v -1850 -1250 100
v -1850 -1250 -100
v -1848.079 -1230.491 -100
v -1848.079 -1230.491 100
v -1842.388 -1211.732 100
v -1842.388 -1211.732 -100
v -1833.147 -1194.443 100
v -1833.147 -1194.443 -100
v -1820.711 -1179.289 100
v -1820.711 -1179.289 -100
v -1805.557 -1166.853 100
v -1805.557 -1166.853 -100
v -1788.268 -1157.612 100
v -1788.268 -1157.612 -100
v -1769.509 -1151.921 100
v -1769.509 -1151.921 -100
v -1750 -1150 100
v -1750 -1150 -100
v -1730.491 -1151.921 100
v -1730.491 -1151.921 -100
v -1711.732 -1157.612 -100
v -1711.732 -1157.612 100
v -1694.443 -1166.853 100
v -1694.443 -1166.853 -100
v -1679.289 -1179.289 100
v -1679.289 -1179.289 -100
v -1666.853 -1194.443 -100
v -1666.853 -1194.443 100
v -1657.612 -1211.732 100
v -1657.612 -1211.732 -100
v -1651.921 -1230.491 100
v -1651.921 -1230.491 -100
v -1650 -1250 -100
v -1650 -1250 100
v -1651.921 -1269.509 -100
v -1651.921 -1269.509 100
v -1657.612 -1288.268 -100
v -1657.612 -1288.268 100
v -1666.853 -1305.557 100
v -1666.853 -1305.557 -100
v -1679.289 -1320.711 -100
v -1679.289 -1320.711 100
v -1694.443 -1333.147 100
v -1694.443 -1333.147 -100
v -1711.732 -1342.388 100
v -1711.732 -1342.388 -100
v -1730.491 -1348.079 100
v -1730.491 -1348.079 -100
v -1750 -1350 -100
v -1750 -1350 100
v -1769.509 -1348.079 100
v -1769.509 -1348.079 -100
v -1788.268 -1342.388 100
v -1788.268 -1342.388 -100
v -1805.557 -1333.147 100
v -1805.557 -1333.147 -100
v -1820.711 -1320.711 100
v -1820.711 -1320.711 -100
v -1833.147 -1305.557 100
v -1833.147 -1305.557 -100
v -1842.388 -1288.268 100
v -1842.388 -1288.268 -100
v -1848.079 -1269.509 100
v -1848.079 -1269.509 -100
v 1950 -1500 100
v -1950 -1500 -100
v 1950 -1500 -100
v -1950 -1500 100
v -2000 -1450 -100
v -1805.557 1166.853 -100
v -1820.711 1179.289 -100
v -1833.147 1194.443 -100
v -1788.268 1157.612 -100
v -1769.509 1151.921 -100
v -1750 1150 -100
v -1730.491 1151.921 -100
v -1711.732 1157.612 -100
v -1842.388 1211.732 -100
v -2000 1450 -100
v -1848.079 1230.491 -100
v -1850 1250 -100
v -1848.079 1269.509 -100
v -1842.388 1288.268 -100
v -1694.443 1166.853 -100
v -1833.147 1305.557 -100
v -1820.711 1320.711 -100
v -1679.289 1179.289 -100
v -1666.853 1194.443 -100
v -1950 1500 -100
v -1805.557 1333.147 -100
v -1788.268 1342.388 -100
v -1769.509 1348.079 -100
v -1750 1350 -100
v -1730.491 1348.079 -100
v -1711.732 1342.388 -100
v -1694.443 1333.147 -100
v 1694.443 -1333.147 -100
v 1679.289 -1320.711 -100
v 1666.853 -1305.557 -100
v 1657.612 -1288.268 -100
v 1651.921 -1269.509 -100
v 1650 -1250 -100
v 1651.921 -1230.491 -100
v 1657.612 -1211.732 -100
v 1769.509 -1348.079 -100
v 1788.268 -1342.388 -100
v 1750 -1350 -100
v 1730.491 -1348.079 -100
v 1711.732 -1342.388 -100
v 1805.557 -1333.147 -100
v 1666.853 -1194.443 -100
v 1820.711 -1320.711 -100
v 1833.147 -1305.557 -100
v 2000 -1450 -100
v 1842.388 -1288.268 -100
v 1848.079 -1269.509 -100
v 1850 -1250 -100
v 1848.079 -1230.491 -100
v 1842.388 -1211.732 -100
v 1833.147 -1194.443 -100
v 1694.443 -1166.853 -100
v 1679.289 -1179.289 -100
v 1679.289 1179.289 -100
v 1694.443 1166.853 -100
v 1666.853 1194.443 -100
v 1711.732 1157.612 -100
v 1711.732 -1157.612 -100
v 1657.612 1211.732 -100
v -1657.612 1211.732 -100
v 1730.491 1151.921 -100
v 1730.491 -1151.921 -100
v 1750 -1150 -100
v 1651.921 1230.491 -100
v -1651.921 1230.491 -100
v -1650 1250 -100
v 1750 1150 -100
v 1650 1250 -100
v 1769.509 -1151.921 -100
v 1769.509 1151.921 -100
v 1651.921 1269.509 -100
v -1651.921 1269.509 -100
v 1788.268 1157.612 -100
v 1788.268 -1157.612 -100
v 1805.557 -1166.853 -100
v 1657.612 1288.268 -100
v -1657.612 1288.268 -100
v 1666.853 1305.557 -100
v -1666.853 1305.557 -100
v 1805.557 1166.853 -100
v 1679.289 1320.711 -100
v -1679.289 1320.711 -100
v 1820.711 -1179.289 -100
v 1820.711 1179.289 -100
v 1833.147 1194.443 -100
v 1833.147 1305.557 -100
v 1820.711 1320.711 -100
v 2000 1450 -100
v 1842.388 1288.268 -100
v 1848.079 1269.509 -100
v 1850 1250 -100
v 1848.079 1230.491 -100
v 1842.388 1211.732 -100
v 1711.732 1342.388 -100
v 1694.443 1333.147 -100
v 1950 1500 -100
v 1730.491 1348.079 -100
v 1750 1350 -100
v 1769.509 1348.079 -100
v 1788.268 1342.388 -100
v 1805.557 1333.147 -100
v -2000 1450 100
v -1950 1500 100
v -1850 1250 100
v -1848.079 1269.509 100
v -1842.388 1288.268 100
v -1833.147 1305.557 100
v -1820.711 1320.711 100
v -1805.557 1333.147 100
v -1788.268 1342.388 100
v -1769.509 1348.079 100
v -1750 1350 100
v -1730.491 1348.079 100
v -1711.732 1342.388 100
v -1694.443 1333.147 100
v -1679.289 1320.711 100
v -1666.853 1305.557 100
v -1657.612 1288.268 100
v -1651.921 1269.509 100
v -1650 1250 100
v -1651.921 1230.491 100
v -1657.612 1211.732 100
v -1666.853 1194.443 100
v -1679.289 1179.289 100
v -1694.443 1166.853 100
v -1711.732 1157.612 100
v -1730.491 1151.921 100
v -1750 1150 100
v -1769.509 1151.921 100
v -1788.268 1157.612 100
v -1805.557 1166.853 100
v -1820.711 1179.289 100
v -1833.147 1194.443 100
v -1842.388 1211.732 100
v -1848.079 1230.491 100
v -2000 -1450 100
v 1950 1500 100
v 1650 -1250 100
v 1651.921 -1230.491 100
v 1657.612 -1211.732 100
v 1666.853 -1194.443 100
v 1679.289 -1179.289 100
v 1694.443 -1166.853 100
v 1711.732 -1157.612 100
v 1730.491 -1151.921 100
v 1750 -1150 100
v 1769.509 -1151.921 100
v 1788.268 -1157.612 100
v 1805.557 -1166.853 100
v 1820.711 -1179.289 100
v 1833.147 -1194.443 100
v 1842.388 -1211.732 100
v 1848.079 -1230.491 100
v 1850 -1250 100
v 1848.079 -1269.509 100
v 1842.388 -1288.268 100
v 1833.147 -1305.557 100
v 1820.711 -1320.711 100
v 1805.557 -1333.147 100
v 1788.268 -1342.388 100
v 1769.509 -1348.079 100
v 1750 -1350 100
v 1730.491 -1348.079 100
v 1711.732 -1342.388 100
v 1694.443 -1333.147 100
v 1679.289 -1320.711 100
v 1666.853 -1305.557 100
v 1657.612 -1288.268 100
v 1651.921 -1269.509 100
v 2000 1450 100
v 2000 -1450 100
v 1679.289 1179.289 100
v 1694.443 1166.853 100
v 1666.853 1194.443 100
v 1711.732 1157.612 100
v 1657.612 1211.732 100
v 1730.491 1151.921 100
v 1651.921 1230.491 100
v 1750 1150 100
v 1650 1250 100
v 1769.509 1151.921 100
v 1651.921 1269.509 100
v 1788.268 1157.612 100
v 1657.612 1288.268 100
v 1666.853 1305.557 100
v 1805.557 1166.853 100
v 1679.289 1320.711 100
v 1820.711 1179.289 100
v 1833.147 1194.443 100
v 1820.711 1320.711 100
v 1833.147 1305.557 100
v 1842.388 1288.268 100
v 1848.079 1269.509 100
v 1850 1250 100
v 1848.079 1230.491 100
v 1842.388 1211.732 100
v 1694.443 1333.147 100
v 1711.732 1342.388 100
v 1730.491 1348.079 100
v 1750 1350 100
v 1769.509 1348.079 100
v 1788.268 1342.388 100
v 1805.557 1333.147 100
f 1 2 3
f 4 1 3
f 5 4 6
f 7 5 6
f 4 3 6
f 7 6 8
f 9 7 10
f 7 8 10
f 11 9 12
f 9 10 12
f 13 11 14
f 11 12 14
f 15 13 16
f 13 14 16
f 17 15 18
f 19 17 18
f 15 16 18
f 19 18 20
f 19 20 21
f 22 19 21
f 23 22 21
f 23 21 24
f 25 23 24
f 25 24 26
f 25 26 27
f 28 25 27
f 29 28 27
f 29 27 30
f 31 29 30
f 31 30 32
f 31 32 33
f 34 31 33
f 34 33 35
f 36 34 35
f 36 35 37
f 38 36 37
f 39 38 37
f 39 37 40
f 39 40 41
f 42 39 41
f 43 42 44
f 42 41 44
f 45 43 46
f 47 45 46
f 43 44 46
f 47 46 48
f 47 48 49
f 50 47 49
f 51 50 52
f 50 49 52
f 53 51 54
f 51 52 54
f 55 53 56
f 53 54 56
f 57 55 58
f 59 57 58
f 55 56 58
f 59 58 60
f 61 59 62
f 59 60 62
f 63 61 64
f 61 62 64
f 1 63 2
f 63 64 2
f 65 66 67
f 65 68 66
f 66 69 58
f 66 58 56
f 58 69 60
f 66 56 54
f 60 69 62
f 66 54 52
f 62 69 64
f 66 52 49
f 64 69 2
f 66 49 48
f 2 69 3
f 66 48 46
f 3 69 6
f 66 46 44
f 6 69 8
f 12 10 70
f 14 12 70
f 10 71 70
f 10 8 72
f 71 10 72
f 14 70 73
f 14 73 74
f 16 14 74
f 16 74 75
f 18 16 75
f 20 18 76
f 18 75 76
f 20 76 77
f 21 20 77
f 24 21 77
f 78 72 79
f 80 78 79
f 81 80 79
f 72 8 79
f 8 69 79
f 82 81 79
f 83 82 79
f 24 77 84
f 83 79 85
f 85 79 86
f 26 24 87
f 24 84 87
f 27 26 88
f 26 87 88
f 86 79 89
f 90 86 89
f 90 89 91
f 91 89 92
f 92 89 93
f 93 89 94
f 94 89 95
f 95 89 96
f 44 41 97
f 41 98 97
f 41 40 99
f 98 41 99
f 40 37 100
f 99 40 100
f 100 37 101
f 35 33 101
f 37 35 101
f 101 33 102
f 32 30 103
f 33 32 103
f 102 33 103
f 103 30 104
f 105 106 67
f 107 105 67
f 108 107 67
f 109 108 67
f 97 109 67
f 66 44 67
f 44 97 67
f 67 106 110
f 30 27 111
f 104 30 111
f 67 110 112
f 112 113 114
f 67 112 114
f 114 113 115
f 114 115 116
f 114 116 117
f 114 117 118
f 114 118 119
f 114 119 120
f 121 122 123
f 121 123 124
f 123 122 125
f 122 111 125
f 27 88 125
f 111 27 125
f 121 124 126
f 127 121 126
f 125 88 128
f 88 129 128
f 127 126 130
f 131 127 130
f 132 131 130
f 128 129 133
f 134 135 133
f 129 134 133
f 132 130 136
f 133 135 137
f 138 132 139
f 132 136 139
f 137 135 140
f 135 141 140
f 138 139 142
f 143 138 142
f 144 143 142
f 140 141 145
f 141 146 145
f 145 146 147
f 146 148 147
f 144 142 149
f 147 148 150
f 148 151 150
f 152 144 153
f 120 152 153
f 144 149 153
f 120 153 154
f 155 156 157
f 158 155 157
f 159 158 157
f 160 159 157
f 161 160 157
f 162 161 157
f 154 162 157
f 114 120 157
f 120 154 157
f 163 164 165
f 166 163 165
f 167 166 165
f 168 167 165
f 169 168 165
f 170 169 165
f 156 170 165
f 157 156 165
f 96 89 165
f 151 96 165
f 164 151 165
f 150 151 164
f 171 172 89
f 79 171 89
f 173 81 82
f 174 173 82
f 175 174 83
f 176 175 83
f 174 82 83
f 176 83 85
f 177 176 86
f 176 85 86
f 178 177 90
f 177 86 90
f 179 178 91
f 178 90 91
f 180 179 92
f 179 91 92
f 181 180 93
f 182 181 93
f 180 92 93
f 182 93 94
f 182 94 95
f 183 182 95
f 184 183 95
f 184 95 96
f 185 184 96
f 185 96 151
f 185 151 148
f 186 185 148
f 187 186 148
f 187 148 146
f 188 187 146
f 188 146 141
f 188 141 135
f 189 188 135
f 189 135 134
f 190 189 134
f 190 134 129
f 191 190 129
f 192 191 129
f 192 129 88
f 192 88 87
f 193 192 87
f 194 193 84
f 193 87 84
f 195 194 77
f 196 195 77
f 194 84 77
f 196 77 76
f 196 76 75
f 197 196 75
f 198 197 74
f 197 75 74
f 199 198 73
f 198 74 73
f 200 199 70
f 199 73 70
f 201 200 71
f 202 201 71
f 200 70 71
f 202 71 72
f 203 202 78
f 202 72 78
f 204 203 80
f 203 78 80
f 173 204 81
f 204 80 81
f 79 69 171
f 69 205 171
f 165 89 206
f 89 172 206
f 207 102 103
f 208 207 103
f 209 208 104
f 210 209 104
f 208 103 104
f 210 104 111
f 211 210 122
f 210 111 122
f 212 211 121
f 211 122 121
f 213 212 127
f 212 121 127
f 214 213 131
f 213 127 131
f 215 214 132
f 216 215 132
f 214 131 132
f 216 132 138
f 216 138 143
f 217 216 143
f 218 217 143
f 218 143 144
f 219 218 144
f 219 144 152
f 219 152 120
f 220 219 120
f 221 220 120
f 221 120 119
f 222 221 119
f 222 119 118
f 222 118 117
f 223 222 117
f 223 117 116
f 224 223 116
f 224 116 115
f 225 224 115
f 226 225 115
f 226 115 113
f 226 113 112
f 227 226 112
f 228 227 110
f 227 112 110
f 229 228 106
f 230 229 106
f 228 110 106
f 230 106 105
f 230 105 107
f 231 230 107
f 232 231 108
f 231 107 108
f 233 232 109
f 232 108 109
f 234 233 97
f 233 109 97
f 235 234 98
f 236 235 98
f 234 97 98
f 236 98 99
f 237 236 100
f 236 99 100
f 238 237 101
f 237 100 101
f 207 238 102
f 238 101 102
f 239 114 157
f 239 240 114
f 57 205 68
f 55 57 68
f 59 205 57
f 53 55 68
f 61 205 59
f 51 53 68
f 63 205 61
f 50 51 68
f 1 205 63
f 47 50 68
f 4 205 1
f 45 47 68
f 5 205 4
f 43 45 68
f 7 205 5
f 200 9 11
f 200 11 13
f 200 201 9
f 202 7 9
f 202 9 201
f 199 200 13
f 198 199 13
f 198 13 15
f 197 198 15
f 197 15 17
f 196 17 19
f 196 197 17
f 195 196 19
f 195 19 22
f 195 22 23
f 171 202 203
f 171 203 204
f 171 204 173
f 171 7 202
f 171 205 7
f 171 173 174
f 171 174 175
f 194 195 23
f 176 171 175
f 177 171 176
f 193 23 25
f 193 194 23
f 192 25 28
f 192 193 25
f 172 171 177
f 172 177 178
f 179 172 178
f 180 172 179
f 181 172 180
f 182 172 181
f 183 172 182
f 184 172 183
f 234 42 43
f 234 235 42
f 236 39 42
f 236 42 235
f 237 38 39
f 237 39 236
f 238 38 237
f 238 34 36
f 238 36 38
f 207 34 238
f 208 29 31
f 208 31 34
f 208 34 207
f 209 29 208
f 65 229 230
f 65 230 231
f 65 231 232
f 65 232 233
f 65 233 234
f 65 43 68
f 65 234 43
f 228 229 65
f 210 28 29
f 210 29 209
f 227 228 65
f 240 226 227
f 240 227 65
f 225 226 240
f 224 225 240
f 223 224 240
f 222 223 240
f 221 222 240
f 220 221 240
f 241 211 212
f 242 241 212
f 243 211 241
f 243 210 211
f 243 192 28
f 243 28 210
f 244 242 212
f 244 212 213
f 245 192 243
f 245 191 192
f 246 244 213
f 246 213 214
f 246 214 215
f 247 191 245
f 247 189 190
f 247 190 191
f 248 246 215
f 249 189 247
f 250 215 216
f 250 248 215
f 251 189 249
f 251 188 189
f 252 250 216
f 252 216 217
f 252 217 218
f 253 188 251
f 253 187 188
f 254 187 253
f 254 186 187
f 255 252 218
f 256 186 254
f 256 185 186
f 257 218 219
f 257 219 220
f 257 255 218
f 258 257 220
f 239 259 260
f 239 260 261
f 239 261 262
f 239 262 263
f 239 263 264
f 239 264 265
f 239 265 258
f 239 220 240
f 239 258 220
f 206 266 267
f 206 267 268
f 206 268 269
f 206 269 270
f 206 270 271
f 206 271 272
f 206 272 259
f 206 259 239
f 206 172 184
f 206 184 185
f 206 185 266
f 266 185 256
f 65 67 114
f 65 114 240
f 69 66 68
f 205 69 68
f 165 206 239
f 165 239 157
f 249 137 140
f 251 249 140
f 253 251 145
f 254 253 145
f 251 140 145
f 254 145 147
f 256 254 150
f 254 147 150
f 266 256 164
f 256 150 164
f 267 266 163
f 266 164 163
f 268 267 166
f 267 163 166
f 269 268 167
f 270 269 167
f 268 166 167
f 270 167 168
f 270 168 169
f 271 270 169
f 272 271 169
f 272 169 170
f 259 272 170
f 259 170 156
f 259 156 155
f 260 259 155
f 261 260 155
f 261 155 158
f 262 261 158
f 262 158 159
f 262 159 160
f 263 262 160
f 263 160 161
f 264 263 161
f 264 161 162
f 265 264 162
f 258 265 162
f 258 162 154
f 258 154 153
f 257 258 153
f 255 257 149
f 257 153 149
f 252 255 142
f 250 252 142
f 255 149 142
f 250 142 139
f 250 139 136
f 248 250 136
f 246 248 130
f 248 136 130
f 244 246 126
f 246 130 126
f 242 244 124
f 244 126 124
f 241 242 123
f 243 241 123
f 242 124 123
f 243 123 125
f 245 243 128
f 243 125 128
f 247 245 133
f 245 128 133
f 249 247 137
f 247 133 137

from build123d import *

# Parameters (mm, degrees)
F0_W     = 4000
F0_H     = 3000
F1_DEPTH = 100
F2_SIZE  = 50
F4_D     = 200


with BuildPart() as f1:
    # F0 (on Top) → F1 (new body, symmetric)
    with BuildSketch(Plane.XY):
        Rectangle(F0_W, F0_H)
    extrude(amount=F1_DEPTH, both=True)

    # F2
    f2_edges = [f1.edges().sort_by_distance(p)[0] for p in [
        (-2000, -1500, 0),
        (2000, 1500, 0),
        (2000, -1500, 0),
        (-2000, 1500, 0),
    ]]
    chamfer(f2_edges, length=F2_SIZE)

    # F4 (through all)
    with Locations(Plane.XY.offset(100)):
        with Locations((-1750, 1250), (1750, 1250), (-1750, -1250), (1750, -1250)):
            Hole(F4_D / 2)


solid = f1.part
